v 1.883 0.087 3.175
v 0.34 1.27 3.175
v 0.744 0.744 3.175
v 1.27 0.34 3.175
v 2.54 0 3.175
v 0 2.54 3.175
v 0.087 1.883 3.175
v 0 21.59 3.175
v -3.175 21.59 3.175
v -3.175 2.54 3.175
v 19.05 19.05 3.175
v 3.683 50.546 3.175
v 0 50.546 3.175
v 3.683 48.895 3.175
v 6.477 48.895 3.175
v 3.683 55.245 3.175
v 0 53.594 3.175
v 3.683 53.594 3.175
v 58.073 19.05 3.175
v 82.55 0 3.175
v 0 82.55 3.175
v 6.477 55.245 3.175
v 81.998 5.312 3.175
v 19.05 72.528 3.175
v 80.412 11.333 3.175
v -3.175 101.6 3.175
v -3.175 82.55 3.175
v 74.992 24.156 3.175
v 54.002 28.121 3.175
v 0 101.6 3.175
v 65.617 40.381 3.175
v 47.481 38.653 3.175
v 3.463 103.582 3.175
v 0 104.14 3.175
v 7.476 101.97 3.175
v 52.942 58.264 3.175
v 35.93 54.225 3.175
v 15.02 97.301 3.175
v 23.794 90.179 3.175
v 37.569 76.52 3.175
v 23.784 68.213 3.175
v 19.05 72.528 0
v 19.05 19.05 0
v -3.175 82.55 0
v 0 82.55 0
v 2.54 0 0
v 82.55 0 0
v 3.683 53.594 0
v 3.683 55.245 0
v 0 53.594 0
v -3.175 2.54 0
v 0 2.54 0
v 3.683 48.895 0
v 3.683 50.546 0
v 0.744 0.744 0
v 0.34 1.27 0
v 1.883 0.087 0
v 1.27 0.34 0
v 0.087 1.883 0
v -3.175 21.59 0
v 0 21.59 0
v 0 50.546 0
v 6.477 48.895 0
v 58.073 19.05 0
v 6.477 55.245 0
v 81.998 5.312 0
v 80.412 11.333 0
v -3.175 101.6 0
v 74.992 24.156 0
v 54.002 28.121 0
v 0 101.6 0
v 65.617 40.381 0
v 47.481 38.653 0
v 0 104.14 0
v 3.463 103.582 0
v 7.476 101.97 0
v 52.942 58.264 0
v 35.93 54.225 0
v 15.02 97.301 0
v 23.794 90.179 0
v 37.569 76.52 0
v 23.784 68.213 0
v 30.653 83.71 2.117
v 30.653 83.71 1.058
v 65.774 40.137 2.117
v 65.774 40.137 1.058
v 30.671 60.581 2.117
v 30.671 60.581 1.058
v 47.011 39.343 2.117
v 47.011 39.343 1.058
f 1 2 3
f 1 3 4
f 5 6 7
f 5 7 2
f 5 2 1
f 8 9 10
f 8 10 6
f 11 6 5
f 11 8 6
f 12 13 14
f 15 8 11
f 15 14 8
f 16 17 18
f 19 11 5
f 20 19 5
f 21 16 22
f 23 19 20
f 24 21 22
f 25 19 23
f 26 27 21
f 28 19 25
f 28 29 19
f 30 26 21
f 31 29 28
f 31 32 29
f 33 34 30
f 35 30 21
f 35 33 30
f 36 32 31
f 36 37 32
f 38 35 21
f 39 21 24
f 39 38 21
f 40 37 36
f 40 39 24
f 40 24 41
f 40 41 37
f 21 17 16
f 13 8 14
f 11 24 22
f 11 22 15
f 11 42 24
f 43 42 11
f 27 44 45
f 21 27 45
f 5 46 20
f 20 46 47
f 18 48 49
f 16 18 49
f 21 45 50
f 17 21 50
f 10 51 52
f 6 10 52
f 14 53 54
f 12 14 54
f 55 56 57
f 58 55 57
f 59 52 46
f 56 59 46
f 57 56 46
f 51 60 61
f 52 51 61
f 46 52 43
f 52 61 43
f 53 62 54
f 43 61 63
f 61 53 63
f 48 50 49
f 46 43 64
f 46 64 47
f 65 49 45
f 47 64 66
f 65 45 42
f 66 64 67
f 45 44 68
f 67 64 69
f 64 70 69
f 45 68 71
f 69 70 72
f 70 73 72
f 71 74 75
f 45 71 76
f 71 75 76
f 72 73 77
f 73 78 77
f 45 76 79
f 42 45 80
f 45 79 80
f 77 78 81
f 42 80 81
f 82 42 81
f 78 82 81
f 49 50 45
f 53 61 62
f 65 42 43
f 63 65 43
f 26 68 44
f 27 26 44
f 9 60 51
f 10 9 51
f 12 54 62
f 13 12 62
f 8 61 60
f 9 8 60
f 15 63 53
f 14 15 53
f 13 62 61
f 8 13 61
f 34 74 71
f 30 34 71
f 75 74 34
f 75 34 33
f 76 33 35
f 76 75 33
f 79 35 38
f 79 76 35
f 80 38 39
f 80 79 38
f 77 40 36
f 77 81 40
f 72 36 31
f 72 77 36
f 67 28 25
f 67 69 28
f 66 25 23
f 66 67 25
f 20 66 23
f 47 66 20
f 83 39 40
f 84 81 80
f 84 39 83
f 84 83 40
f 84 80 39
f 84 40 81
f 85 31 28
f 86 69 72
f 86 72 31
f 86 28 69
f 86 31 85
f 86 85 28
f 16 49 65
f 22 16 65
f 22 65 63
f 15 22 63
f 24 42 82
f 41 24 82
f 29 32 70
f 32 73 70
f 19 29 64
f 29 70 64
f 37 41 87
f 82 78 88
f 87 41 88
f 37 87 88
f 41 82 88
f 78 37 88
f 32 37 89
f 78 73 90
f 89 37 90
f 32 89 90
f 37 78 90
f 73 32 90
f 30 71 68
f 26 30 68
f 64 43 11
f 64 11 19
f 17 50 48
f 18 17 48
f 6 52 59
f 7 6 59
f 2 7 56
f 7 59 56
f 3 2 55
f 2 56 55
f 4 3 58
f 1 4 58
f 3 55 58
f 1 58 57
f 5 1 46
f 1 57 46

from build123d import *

# Parameters (mm, degrees)
BOSS_EXTRUDE1_DEPTH = 3.175


with BuildPart() as part:
    # Sketch1 → Boss-Extrude1 (new body)
    with BuildSketch(Plane.XY):
        with BuildLine():
            Line((0, 82.55), (0, 53.594))
            Line((0, 53.594), (3.683, 53.594))
            Line((3.683, 53.594), (3.683, 55.245))
            Line((3.683, 55.245), (6.477, 55.245))
            Line((6.477, 55.245), (6.477, 48.895))
            Line((6.477, 48.895), (3.683, 48.895))
            Line((3.683, 48.895), (3.683, 50.546))
            Line((3.683, 50.546), (0, 50.546))
            Line((0, 50.546), (0, 21.59))
            Line((0, 21.59), (-3.175, 21.59))
            Line((-3.175, 21.59), (-3.175, 2.54))
            Line((-3.175, 2.54), (0, 2.54))
            ThreePointArc((0, 2.54), (0.743948776, 0.743948776), (2.54, 0))
            Line((2.54, 0), (82.55, 0))
            add(Edge.make_bspline(
                [(0, 104.14), (20.815651588, 104.14), (82.55, 29.560059324), (82.55, 0)],
                knots=[0, 0, 0, 0, 1, 1, 1, 1], degree=3))
            Line((0, 104.14), (0, 101.6))
            Line((0, 101.6), (-3.175, 101.6))
            Line((-3.175, 101.6), (-3.175, 82.55))
            Line((-3.175, 82.55), (0, 82.55))
        make_face()
        with BuildLine():
            Line((19.05, 72.527700628), (19.05, 19.05))
            Line((19.05, 19.05), (58.0732756, 19.05))
            add(Edge.make_bspline(
                [(19.05, 72.527700628), (24.979605929, 68.637560894), (52.981970502, 35.459305466), (58.0732756, 19.05)],
                knots=[0, 0, 0, 0, 1, 1, 1, 1], degree=3))
        make_face(mode=Mode.SUBTRACT)
    extrude(amount=BOSS_EXTRUDE1_DEPTH)


solid = part.part
